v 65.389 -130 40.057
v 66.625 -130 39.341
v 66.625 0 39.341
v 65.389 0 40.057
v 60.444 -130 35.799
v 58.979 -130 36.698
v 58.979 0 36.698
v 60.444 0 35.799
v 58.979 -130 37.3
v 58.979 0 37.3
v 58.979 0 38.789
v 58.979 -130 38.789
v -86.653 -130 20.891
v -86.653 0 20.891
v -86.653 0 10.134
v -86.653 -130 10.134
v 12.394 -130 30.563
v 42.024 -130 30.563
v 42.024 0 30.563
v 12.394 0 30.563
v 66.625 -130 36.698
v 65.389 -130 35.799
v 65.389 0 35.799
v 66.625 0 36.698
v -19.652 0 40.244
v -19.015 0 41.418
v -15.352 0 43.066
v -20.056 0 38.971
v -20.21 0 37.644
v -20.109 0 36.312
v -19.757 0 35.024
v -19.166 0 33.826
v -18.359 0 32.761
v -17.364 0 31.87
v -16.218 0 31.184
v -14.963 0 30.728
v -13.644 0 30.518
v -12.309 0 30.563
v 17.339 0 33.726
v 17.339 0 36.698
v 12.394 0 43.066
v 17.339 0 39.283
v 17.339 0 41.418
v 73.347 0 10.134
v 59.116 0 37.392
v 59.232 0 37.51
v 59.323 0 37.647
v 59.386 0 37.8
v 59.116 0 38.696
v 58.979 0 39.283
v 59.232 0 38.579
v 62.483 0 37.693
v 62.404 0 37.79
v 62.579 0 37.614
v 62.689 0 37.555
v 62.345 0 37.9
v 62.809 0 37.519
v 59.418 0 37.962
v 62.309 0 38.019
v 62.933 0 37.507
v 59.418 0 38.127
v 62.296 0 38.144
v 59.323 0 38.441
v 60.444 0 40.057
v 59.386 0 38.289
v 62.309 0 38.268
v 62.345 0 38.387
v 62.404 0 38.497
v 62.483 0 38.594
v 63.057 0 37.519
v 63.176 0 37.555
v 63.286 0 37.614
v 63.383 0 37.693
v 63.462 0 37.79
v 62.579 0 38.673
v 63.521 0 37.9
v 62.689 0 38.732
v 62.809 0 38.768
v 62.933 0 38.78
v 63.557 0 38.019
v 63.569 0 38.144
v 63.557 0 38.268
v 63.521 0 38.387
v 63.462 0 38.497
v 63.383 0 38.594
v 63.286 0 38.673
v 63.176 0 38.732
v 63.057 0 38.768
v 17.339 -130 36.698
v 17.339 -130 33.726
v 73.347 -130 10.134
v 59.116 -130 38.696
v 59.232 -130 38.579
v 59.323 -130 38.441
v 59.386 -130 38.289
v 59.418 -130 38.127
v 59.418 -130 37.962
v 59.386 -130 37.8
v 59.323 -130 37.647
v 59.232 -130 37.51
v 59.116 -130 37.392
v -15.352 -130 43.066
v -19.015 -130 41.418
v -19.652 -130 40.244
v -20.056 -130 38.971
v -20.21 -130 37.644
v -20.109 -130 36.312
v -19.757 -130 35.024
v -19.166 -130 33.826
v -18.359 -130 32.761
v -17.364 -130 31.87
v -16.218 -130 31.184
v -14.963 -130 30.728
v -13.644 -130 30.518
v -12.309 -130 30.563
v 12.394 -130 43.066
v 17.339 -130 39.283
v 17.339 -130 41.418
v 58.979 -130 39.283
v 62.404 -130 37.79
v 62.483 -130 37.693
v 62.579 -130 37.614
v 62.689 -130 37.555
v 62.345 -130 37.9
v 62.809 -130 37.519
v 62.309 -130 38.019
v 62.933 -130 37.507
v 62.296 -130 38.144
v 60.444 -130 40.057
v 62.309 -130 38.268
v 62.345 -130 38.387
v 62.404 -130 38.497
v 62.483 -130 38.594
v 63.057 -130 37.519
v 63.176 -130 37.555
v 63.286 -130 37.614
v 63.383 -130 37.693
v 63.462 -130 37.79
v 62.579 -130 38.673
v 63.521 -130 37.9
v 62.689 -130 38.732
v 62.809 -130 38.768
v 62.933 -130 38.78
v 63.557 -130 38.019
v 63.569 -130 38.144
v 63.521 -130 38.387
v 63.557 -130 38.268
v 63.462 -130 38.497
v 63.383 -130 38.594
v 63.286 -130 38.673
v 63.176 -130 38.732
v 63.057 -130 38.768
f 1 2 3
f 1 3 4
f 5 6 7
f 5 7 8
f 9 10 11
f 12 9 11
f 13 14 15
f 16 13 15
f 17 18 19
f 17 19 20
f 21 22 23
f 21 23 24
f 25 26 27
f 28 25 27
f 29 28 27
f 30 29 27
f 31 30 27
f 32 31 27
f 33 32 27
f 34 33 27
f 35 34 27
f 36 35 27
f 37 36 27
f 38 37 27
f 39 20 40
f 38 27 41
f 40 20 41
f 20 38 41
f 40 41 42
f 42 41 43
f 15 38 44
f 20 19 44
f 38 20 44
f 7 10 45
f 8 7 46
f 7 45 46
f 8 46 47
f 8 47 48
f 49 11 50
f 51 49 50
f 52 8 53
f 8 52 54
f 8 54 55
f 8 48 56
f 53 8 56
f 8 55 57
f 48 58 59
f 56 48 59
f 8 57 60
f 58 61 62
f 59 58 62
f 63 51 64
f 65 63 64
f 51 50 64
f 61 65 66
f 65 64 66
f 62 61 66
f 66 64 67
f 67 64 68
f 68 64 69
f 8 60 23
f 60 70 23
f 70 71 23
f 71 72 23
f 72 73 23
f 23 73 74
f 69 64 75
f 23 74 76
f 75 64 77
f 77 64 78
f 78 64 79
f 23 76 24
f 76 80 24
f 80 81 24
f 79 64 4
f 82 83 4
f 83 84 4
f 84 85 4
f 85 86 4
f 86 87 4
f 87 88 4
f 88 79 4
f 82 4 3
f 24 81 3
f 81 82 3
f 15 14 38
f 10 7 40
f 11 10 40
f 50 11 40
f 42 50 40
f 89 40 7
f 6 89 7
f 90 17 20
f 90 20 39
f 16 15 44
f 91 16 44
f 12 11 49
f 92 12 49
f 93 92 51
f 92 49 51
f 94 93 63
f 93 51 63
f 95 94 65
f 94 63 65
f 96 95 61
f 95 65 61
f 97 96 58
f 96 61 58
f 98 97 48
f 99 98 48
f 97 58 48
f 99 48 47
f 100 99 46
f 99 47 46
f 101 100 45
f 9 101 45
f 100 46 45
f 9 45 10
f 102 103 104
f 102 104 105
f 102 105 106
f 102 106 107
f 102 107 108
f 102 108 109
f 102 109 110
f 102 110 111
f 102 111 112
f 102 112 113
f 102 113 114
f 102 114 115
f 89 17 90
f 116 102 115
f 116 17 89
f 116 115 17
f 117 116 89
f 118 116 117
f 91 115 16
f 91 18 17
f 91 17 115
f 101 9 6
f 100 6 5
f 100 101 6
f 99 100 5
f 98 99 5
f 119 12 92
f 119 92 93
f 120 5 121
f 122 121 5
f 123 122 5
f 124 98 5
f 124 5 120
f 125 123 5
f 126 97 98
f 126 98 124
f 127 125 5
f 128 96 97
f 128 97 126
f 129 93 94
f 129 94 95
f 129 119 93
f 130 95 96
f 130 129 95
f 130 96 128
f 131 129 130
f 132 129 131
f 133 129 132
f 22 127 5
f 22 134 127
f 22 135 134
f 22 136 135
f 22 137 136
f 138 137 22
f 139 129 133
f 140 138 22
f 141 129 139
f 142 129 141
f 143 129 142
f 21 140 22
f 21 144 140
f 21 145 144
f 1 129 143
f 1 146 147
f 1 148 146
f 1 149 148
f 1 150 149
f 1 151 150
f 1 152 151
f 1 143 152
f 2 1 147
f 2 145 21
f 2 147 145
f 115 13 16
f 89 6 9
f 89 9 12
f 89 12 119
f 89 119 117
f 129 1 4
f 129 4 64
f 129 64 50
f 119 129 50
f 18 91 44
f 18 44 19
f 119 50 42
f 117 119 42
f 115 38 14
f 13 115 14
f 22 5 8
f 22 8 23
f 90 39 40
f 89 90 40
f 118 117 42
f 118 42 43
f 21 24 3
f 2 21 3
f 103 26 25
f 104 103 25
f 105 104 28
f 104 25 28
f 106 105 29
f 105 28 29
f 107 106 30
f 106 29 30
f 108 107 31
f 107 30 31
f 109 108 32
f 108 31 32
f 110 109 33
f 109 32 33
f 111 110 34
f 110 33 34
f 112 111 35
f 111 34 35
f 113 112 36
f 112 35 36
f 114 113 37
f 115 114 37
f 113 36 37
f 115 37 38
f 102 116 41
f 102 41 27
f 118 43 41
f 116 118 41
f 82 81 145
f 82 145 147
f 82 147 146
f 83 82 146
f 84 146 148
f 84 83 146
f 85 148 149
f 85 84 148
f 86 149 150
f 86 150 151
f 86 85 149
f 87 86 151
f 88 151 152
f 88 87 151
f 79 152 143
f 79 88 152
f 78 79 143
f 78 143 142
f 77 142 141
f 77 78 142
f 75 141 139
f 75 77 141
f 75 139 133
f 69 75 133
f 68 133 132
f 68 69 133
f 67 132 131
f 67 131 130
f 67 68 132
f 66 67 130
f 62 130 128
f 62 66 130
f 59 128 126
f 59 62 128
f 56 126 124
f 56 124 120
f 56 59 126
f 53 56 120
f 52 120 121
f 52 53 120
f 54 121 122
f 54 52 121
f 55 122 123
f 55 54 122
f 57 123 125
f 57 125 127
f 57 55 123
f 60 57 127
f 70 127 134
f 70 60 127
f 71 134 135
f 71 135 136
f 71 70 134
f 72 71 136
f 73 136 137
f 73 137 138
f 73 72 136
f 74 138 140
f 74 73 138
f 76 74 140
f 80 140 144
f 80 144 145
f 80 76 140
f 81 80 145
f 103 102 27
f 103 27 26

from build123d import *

# Parameters (mm, degrees)
F0_R     = 0.636476
F1_DEPTH = 130


with BuildPart() as f1:
    # F0 (on Front) → F1 (new body)
    with BuildSketch(Plane.XZ):
        Polygon((-12.308648, 30.563487), (-86.652653, 20.890858), (-86.652653, 10.133532), (73.347347, 10.133532), (42.023724, 30.563487), (12.39394, 30.563487), align=None)
        with BuildLine():
            ThreePointArc((-19.014622, 41.418116), (-19.166356, 33.82559), (-12.308648, 30.563487))
            Line((-12.308648, 30.563487), (12.39394, 30.563487))
            Line((12.39394, 30.563487), (17.338732, 33.726226))
            Line((17.338732, 33.726226), (17.338732, 36.697887))
            Line((17.338732, 36.697887), (17.338732, 39.282866))
            Line((17.338732, 39.282866), (17.338732, 41.418116))
            Line((17.338732, 41.418116), (12.39394, 43.066382))
            Line((12.39394, 43.066382), (-15.351817, 43.066382))
            Line((-15.351817, 43.066382), (-19.014622, 41.418116))
        make_face()
        Polygon((17.338732, 39.282866), (17.338732, 36.697887), (58.978832, 36.697887), (58.978832, 37.299656), (58.978832, 38.788896), (58.978832, 39.282866), align=None)
        with BuildLine():
            Line((58.978832, 37.299656), (58.978832, 36.697887))
            Line((58.978832, 36.697887), (60.444385, 35.799279))
            Line((60.444385, 35.799279), (65.389156, 35.799279))
            Line((65.389156, 35.799279), (66.625345, 36.697887))
            Line((66.625345, 36.697887), (66.625345, 39.341377))
            Line((66.625345, 39.341377), (65.389156, 40.057271))
            Line((65.389156, 40.057271), (60.444385, 40.057271))
            Line((60.444385, 40.057271), (58.978832, 39.282866))
            Line((58.978832, 39.282866), (58.978832, 38.788896))
            ThreePointArc((58.978832, 38.788896), (59.421711, 38.044276), (58.978832, 37.299656))
        make_face()
        with Locations((62.932795, 38.143512)):
            Circle(F0_R, mode=Mode.SUBTRACT)
    extrude(amount=F1_DEPTH)


solid = f1.part
